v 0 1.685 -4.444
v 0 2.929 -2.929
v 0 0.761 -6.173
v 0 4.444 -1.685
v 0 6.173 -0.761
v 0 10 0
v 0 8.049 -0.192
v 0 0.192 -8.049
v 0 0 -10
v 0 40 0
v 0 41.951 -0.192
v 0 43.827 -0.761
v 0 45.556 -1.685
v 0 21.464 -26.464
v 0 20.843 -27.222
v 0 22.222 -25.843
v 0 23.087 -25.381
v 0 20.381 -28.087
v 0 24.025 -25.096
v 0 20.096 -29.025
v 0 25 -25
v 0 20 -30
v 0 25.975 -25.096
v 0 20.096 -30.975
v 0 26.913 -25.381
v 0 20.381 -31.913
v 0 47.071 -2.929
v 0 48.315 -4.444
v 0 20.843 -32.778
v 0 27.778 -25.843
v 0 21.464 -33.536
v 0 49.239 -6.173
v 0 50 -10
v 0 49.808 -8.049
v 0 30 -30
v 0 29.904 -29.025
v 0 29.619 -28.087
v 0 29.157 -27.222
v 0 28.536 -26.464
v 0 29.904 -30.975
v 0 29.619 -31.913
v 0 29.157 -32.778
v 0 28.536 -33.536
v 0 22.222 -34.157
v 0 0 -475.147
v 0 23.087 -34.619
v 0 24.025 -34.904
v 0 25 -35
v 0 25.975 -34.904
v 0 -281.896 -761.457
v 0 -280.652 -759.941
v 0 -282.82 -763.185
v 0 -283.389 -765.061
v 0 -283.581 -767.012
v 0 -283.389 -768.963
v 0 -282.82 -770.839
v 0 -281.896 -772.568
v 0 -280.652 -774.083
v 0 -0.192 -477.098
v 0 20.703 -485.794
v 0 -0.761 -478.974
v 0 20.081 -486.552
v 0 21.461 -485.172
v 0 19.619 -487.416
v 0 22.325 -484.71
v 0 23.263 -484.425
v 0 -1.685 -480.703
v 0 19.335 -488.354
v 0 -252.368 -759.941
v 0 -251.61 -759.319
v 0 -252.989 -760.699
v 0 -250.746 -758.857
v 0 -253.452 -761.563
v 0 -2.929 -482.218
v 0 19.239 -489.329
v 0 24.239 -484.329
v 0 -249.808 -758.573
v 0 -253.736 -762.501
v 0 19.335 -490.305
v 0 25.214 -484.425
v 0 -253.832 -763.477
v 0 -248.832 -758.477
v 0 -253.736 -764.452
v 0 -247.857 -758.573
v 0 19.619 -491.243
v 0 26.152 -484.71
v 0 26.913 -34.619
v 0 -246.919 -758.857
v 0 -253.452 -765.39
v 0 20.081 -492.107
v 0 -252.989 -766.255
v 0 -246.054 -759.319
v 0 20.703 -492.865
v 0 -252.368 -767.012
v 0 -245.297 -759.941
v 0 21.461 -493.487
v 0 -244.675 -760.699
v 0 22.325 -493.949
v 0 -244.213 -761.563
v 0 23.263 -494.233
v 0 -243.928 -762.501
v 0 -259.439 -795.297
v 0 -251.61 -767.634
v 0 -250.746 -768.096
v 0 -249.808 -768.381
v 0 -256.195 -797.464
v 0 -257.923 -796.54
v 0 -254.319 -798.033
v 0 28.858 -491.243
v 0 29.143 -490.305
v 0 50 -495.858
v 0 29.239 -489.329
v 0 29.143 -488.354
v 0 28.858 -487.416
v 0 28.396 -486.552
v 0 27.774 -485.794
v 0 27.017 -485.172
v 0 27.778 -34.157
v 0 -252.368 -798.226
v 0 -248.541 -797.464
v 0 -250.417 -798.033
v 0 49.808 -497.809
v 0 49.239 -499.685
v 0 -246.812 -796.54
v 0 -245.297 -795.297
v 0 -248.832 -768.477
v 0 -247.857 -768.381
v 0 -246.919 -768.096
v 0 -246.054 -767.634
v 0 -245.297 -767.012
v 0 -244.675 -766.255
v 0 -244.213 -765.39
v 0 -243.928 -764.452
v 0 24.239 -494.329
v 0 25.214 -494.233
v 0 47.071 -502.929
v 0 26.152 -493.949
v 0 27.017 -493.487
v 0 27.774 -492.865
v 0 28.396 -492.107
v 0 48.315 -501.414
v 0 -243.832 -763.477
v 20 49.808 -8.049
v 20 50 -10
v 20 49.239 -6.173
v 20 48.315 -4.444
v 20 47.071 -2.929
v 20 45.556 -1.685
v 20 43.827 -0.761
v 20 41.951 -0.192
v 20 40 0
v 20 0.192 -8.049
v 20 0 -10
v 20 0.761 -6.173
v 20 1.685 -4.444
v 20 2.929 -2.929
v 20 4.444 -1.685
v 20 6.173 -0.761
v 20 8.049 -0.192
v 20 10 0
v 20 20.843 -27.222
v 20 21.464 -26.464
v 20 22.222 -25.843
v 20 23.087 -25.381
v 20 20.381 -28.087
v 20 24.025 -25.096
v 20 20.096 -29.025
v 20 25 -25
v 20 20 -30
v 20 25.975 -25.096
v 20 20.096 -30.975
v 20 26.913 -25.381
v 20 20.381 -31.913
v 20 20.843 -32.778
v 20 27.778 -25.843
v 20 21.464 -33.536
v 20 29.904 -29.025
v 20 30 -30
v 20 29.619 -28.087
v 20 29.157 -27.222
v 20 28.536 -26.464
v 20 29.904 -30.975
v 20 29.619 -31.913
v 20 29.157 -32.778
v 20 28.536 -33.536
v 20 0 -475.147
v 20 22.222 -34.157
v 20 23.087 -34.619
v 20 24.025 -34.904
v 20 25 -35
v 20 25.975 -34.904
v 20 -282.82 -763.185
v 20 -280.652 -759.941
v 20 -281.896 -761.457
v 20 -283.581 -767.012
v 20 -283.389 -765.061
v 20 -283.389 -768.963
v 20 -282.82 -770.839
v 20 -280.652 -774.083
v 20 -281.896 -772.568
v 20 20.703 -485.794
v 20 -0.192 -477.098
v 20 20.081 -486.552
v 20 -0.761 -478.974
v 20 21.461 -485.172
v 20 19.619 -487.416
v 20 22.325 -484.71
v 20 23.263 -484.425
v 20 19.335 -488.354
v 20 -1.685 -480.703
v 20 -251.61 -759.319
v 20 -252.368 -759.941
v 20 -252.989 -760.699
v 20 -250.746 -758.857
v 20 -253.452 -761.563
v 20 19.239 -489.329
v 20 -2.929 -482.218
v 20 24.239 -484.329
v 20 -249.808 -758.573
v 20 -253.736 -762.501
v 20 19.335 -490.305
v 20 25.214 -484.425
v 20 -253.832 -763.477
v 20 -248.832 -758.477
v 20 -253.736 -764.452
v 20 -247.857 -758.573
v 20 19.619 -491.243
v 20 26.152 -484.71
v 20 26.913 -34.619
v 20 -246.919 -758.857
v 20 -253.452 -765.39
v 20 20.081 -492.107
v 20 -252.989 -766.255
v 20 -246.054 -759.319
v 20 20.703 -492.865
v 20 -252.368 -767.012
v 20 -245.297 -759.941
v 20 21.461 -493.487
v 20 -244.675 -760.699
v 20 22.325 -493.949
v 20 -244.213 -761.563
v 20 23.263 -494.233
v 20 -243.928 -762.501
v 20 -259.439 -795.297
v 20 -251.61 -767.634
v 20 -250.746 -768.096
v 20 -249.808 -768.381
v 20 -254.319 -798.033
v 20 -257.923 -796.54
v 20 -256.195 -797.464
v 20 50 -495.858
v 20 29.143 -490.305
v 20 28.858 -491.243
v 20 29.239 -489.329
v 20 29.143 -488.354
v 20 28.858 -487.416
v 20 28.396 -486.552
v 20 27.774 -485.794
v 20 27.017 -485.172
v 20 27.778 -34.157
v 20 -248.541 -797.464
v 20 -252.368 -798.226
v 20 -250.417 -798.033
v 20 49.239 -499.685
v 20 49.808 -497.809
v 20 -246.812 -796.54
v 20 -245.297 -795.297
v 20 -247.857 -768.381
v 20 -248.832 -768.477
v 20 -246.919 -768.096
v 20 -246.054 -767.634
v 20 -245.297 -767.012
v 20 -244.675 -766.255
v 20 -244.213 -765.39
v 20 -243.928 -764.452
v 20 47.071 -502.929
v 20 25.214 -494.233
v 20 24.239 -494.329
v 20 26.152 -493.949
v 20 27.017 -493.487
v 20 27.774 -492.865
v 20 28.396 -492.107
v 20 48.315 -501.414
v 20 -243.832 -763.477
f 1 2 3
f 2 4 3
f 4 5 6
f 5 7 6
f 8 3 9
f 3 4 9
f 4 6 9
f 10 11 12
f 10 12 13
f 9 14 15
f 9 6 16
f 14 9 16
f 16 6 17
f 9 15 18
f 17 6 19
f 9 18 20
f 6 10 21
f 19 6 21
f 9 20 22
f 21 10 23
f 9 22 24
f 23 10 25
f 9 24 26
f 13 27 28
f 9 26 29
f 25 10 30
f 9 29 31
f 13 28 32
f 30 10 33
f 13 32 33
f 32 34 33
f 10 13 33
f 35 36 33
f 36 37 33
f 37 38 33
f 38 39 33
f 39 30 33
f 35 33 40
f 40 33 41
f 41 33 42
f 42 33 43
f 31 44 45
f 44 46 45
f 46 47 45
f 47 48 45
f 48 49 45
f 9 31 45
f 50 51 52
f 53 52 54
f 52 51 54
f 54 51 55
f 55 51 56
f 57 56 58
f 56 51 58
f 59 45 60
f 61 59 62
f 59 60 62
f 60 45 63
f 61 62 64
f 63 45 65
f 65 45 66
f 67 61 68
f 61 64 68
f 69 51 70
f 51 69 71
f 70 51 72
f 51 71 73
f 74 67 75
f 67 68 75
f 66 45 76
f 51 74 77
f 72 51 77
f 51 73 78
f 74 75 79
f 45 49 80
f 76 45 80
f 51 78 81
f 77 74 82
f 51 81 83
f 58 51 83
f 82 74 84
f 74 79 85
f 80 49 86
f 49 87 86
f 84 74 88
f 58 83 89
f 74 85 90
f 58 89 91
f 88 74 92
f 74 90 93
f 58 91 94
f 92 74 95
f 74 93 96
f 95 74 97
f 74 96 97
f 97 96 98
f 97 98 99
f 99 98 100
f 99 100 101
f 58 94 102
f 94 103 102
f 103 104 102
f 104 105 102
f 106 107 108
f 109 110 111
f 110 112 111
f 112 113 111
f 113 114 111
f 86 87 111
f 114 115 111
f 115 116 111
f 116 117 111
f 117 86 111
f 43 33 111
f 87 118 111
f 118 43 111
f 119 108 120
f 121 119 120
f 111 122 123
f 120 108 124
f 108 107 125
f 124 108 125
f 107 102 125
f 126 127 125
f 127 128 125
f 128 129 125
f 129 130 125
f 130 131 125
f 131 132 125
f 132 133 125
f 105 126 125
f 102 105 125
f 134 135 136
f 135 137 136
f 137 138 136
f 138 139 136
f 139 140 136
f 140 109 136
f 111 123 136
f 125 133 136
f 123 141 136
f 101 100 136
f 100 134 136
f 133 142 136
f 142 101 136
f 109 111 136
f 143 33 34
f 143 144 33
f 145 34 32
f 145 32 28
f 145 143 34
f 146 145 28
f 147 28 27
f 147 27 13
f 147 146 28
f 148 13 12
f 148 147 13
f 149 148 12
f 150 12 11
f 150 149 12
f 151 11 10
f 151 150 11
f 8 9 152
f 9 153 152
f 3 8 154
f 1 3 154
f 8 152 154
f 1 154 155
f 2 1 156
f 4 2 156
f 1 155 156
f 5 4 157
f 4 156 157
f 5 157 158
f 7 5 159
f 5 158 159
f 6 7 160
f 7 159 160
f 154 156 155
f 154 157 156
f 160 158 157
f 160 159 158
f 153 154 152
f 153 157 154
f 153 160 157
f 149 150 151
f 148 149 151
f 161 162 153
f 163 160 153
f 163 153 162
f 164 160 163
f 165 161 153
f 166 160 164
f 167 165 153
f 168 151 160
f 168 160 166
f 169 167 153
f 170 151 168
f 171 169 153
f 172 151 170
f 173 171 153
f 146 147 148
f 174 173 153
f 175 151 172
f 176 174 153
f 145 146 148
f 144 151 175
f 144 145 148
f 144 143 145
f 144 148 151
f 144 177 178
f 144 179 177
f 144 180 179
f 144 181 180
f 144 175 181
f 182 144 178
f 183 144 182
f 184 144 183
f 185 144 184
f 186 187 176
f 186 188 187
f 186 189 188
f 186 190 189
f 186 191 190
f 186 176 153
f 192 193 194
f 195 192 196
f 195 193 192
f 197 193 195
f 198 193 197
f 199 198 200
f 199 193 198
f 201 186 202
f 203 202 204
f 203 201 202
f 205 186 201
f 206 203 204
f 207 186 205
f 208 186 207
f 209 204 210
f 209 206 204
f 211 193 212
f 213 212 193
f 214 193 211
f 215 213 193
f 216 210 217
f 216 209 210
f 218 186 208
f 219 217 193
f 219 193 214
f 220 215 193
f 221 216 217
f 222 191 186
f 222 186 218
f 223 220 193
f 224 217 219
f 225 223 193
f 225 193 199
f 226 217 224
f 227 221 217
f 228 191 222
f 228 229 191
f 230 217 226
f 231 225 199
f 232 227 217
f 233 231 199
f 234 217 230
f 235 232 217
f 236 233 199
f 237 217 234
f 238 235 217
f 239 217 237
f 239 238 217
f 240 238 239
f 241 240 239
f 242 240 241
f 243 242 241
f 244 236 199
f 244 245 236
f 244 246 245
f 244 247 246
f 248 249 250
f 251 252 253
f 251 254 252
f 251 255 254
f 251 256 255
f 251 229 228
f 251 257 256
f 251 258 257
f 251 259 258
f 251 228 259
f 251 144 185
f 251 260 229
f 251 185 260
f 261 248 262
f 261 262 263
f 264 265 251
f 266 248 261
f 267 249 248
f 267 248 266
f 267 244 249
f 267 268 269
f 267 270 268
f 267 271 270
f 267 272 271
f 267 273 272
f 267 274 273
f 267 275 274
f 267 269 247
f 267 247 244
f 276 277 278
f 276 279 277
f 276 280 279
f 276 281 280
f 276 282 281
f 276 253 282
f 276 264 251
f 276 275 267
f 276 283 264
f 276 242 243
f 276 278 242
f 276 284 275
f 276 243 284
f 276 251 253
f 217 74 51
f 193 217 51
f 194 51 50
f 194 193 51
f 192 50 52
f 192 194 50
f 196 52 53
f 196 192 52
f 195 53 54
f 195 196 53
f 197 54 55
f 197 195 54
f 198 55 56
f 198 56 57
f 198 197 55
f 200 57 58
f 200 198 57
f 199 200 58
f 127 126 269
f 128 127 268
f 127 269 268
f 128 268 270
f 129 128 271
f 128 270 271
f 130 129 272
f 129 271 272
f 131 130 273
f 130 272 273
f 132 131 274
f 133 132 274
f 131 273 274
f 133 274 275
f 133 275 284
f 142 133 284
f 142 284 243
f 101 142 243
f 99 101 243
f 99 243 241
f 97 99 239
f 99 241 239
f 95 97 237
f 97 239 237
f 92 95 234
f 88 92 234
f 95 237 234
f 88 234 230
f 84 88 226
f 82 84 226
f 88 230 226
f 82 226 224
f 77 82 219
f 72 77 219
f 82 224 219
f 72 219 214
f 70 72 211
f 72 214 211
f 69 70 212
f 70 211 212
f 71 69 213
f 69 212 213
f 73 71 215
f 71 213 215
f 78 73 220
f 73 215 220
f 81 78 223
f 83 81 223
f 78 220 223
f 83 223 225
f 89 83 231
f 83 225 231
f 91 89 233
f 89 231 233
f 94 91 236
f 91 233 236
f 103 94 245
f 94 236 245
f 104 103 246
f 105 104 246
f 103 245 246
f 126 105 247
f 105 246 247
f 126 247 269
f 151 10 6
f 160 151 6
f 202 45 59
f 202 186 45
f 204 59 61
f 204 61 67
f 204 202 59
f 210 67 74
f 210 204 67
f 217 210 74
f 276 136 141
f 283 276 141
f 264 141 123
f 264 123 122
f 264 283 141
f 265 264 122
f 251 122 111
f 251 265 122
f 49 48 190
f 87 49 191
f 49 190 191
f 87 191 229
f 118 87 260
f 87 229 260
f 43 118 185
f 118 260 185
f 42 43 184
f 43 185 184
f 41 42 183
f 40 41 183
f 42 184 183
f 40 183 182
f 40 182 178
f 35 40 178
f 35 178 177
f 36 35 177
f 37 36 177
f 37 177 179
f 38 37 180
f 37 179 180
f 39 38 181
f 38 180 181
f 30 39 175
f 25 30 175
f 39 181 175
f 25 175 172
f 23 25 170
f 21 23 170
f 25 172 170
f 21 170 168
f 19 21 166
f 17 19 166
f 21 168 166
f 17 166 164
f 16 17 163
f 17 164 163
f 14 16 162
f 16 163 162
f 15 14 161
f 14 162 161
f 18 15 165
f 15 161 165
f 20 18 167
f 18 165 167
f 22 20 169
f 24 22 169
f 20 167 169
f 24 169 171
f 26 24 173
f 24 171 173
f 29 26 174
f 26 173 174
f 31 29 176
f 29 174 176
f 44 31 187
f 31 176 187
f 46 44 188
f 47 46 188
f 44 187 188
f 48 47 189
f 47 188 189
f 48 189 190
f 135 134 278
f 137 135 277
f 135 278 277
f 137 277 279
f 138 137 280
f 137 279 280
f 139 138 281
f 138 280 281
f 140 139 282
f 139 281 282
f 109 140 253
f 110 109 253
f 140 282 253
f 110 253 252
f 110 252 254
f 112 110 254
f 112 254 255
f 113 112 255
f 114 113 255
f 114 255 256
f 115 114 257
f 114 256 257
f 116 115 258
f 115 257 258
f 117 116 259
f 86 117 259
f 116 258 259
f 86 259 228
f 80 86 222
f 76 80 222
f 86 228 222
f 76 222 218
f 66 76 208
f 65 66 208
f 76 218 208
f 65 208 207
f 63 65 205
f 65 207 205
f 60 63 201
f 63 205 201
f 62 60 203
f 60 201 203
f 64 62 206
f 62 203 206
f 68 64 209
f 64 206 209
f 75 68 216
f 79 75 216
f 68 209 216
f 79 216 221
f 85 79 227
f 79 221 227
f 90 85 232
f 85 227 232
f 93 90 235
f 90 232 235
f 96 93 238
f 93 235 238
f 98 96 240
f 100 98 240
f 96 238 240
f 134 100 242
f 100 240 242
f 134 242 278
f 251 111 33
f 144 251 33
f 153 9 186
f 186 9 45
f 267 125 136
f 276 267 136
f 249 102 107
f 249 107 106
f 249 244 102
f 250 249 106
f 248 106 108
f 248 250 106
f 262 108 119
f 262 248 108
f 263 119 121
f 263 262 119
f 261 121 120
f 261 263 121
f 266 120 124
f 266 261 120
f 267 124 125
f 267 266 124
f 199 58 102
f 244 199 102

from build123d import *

# Parameters (mm, degrees)
BOSS_EXTRUDE1_DEPTH = 20
FILLET1_R           = 10
SKETCH2_R           = 5
CUT_EXTRUDE1_DEPTH  = 20
SKETCH3_R           = 5
CUT_EXTRUDE2_DEPTH  = 20
SKETCH4_R           = 5
CUT_EXTRUDE3_DEPTH  = 20


with BuildPart() as part:
    # Sketch1 → Boss-Extrude1 (new body)
    with BuildSketch(Plane(origin=(0, 0, 0), x_dir=(0, 0, -1), z_dir=(1, 0, 0))):
        Polygon((0, 0), (479.289321881, 0), (767.012334311, -287.72301243), (802.367673371, -252.367673371), (500, 50), (0, 50), align=None)
    extrude(amount=BOSS_EXTRUDE1_DEPTH)

    # Fillet1
    fillet1_edges = [part.edges().sort_by_distance(p)[0] for p in [
        (10, 0, 0),
        (10, 50, 0),
        (10, 50, -500),
        (10, -252.367673371, -802.367673371),
        (10, -287.72301243, -767.012334311),
        (10, 0, -479.289321881),
    ]]
    fillet(fillet1_edges, radius=FILLET1_R)

    # Sketch2 → Cut-Extrude1 (cut)
    with BuildSketch(Plane(origin=(20, 0, 0), x_dir=(0, 0, -1), z_dir=(1, 0, 0))):
        with Locations((30, 25)):
            Circle(SKETCH2_R)
    extrude(amount=-CUT_EXTRUDE1_DEPTH, mode=Mode.SUBTRACT)

    # Sketch3 → Cut-Extrude2 (cut)
    with BuildSketch(Plane(origin=(20, 0, 0), x_dir=(0, 0, -1), z_dir=(1, 0, 0))):
        with Locations((763.476800406, -248.832139465)):
            Circle(SKETCH3_R)
    extrude(amount=-CUT_EXTRUDE2_DEPTH, mode=Mode.SUBTRACT)

    # Sketch4 → Cut-Extrude3 (cut)
    with BuildSketch(Plane(origin=(20, 0, 0), x_dir=(0, 0, -1), z_dir=(1, 0, 0))):
        with Locations((489.329359641, 24.238795325)):
            Circle(SKETCH4_R)
    extrude(amount=-CUT_EXTRUDE3_DEPTH, mode=Mode.SUBTRACT)


solid = part.part
